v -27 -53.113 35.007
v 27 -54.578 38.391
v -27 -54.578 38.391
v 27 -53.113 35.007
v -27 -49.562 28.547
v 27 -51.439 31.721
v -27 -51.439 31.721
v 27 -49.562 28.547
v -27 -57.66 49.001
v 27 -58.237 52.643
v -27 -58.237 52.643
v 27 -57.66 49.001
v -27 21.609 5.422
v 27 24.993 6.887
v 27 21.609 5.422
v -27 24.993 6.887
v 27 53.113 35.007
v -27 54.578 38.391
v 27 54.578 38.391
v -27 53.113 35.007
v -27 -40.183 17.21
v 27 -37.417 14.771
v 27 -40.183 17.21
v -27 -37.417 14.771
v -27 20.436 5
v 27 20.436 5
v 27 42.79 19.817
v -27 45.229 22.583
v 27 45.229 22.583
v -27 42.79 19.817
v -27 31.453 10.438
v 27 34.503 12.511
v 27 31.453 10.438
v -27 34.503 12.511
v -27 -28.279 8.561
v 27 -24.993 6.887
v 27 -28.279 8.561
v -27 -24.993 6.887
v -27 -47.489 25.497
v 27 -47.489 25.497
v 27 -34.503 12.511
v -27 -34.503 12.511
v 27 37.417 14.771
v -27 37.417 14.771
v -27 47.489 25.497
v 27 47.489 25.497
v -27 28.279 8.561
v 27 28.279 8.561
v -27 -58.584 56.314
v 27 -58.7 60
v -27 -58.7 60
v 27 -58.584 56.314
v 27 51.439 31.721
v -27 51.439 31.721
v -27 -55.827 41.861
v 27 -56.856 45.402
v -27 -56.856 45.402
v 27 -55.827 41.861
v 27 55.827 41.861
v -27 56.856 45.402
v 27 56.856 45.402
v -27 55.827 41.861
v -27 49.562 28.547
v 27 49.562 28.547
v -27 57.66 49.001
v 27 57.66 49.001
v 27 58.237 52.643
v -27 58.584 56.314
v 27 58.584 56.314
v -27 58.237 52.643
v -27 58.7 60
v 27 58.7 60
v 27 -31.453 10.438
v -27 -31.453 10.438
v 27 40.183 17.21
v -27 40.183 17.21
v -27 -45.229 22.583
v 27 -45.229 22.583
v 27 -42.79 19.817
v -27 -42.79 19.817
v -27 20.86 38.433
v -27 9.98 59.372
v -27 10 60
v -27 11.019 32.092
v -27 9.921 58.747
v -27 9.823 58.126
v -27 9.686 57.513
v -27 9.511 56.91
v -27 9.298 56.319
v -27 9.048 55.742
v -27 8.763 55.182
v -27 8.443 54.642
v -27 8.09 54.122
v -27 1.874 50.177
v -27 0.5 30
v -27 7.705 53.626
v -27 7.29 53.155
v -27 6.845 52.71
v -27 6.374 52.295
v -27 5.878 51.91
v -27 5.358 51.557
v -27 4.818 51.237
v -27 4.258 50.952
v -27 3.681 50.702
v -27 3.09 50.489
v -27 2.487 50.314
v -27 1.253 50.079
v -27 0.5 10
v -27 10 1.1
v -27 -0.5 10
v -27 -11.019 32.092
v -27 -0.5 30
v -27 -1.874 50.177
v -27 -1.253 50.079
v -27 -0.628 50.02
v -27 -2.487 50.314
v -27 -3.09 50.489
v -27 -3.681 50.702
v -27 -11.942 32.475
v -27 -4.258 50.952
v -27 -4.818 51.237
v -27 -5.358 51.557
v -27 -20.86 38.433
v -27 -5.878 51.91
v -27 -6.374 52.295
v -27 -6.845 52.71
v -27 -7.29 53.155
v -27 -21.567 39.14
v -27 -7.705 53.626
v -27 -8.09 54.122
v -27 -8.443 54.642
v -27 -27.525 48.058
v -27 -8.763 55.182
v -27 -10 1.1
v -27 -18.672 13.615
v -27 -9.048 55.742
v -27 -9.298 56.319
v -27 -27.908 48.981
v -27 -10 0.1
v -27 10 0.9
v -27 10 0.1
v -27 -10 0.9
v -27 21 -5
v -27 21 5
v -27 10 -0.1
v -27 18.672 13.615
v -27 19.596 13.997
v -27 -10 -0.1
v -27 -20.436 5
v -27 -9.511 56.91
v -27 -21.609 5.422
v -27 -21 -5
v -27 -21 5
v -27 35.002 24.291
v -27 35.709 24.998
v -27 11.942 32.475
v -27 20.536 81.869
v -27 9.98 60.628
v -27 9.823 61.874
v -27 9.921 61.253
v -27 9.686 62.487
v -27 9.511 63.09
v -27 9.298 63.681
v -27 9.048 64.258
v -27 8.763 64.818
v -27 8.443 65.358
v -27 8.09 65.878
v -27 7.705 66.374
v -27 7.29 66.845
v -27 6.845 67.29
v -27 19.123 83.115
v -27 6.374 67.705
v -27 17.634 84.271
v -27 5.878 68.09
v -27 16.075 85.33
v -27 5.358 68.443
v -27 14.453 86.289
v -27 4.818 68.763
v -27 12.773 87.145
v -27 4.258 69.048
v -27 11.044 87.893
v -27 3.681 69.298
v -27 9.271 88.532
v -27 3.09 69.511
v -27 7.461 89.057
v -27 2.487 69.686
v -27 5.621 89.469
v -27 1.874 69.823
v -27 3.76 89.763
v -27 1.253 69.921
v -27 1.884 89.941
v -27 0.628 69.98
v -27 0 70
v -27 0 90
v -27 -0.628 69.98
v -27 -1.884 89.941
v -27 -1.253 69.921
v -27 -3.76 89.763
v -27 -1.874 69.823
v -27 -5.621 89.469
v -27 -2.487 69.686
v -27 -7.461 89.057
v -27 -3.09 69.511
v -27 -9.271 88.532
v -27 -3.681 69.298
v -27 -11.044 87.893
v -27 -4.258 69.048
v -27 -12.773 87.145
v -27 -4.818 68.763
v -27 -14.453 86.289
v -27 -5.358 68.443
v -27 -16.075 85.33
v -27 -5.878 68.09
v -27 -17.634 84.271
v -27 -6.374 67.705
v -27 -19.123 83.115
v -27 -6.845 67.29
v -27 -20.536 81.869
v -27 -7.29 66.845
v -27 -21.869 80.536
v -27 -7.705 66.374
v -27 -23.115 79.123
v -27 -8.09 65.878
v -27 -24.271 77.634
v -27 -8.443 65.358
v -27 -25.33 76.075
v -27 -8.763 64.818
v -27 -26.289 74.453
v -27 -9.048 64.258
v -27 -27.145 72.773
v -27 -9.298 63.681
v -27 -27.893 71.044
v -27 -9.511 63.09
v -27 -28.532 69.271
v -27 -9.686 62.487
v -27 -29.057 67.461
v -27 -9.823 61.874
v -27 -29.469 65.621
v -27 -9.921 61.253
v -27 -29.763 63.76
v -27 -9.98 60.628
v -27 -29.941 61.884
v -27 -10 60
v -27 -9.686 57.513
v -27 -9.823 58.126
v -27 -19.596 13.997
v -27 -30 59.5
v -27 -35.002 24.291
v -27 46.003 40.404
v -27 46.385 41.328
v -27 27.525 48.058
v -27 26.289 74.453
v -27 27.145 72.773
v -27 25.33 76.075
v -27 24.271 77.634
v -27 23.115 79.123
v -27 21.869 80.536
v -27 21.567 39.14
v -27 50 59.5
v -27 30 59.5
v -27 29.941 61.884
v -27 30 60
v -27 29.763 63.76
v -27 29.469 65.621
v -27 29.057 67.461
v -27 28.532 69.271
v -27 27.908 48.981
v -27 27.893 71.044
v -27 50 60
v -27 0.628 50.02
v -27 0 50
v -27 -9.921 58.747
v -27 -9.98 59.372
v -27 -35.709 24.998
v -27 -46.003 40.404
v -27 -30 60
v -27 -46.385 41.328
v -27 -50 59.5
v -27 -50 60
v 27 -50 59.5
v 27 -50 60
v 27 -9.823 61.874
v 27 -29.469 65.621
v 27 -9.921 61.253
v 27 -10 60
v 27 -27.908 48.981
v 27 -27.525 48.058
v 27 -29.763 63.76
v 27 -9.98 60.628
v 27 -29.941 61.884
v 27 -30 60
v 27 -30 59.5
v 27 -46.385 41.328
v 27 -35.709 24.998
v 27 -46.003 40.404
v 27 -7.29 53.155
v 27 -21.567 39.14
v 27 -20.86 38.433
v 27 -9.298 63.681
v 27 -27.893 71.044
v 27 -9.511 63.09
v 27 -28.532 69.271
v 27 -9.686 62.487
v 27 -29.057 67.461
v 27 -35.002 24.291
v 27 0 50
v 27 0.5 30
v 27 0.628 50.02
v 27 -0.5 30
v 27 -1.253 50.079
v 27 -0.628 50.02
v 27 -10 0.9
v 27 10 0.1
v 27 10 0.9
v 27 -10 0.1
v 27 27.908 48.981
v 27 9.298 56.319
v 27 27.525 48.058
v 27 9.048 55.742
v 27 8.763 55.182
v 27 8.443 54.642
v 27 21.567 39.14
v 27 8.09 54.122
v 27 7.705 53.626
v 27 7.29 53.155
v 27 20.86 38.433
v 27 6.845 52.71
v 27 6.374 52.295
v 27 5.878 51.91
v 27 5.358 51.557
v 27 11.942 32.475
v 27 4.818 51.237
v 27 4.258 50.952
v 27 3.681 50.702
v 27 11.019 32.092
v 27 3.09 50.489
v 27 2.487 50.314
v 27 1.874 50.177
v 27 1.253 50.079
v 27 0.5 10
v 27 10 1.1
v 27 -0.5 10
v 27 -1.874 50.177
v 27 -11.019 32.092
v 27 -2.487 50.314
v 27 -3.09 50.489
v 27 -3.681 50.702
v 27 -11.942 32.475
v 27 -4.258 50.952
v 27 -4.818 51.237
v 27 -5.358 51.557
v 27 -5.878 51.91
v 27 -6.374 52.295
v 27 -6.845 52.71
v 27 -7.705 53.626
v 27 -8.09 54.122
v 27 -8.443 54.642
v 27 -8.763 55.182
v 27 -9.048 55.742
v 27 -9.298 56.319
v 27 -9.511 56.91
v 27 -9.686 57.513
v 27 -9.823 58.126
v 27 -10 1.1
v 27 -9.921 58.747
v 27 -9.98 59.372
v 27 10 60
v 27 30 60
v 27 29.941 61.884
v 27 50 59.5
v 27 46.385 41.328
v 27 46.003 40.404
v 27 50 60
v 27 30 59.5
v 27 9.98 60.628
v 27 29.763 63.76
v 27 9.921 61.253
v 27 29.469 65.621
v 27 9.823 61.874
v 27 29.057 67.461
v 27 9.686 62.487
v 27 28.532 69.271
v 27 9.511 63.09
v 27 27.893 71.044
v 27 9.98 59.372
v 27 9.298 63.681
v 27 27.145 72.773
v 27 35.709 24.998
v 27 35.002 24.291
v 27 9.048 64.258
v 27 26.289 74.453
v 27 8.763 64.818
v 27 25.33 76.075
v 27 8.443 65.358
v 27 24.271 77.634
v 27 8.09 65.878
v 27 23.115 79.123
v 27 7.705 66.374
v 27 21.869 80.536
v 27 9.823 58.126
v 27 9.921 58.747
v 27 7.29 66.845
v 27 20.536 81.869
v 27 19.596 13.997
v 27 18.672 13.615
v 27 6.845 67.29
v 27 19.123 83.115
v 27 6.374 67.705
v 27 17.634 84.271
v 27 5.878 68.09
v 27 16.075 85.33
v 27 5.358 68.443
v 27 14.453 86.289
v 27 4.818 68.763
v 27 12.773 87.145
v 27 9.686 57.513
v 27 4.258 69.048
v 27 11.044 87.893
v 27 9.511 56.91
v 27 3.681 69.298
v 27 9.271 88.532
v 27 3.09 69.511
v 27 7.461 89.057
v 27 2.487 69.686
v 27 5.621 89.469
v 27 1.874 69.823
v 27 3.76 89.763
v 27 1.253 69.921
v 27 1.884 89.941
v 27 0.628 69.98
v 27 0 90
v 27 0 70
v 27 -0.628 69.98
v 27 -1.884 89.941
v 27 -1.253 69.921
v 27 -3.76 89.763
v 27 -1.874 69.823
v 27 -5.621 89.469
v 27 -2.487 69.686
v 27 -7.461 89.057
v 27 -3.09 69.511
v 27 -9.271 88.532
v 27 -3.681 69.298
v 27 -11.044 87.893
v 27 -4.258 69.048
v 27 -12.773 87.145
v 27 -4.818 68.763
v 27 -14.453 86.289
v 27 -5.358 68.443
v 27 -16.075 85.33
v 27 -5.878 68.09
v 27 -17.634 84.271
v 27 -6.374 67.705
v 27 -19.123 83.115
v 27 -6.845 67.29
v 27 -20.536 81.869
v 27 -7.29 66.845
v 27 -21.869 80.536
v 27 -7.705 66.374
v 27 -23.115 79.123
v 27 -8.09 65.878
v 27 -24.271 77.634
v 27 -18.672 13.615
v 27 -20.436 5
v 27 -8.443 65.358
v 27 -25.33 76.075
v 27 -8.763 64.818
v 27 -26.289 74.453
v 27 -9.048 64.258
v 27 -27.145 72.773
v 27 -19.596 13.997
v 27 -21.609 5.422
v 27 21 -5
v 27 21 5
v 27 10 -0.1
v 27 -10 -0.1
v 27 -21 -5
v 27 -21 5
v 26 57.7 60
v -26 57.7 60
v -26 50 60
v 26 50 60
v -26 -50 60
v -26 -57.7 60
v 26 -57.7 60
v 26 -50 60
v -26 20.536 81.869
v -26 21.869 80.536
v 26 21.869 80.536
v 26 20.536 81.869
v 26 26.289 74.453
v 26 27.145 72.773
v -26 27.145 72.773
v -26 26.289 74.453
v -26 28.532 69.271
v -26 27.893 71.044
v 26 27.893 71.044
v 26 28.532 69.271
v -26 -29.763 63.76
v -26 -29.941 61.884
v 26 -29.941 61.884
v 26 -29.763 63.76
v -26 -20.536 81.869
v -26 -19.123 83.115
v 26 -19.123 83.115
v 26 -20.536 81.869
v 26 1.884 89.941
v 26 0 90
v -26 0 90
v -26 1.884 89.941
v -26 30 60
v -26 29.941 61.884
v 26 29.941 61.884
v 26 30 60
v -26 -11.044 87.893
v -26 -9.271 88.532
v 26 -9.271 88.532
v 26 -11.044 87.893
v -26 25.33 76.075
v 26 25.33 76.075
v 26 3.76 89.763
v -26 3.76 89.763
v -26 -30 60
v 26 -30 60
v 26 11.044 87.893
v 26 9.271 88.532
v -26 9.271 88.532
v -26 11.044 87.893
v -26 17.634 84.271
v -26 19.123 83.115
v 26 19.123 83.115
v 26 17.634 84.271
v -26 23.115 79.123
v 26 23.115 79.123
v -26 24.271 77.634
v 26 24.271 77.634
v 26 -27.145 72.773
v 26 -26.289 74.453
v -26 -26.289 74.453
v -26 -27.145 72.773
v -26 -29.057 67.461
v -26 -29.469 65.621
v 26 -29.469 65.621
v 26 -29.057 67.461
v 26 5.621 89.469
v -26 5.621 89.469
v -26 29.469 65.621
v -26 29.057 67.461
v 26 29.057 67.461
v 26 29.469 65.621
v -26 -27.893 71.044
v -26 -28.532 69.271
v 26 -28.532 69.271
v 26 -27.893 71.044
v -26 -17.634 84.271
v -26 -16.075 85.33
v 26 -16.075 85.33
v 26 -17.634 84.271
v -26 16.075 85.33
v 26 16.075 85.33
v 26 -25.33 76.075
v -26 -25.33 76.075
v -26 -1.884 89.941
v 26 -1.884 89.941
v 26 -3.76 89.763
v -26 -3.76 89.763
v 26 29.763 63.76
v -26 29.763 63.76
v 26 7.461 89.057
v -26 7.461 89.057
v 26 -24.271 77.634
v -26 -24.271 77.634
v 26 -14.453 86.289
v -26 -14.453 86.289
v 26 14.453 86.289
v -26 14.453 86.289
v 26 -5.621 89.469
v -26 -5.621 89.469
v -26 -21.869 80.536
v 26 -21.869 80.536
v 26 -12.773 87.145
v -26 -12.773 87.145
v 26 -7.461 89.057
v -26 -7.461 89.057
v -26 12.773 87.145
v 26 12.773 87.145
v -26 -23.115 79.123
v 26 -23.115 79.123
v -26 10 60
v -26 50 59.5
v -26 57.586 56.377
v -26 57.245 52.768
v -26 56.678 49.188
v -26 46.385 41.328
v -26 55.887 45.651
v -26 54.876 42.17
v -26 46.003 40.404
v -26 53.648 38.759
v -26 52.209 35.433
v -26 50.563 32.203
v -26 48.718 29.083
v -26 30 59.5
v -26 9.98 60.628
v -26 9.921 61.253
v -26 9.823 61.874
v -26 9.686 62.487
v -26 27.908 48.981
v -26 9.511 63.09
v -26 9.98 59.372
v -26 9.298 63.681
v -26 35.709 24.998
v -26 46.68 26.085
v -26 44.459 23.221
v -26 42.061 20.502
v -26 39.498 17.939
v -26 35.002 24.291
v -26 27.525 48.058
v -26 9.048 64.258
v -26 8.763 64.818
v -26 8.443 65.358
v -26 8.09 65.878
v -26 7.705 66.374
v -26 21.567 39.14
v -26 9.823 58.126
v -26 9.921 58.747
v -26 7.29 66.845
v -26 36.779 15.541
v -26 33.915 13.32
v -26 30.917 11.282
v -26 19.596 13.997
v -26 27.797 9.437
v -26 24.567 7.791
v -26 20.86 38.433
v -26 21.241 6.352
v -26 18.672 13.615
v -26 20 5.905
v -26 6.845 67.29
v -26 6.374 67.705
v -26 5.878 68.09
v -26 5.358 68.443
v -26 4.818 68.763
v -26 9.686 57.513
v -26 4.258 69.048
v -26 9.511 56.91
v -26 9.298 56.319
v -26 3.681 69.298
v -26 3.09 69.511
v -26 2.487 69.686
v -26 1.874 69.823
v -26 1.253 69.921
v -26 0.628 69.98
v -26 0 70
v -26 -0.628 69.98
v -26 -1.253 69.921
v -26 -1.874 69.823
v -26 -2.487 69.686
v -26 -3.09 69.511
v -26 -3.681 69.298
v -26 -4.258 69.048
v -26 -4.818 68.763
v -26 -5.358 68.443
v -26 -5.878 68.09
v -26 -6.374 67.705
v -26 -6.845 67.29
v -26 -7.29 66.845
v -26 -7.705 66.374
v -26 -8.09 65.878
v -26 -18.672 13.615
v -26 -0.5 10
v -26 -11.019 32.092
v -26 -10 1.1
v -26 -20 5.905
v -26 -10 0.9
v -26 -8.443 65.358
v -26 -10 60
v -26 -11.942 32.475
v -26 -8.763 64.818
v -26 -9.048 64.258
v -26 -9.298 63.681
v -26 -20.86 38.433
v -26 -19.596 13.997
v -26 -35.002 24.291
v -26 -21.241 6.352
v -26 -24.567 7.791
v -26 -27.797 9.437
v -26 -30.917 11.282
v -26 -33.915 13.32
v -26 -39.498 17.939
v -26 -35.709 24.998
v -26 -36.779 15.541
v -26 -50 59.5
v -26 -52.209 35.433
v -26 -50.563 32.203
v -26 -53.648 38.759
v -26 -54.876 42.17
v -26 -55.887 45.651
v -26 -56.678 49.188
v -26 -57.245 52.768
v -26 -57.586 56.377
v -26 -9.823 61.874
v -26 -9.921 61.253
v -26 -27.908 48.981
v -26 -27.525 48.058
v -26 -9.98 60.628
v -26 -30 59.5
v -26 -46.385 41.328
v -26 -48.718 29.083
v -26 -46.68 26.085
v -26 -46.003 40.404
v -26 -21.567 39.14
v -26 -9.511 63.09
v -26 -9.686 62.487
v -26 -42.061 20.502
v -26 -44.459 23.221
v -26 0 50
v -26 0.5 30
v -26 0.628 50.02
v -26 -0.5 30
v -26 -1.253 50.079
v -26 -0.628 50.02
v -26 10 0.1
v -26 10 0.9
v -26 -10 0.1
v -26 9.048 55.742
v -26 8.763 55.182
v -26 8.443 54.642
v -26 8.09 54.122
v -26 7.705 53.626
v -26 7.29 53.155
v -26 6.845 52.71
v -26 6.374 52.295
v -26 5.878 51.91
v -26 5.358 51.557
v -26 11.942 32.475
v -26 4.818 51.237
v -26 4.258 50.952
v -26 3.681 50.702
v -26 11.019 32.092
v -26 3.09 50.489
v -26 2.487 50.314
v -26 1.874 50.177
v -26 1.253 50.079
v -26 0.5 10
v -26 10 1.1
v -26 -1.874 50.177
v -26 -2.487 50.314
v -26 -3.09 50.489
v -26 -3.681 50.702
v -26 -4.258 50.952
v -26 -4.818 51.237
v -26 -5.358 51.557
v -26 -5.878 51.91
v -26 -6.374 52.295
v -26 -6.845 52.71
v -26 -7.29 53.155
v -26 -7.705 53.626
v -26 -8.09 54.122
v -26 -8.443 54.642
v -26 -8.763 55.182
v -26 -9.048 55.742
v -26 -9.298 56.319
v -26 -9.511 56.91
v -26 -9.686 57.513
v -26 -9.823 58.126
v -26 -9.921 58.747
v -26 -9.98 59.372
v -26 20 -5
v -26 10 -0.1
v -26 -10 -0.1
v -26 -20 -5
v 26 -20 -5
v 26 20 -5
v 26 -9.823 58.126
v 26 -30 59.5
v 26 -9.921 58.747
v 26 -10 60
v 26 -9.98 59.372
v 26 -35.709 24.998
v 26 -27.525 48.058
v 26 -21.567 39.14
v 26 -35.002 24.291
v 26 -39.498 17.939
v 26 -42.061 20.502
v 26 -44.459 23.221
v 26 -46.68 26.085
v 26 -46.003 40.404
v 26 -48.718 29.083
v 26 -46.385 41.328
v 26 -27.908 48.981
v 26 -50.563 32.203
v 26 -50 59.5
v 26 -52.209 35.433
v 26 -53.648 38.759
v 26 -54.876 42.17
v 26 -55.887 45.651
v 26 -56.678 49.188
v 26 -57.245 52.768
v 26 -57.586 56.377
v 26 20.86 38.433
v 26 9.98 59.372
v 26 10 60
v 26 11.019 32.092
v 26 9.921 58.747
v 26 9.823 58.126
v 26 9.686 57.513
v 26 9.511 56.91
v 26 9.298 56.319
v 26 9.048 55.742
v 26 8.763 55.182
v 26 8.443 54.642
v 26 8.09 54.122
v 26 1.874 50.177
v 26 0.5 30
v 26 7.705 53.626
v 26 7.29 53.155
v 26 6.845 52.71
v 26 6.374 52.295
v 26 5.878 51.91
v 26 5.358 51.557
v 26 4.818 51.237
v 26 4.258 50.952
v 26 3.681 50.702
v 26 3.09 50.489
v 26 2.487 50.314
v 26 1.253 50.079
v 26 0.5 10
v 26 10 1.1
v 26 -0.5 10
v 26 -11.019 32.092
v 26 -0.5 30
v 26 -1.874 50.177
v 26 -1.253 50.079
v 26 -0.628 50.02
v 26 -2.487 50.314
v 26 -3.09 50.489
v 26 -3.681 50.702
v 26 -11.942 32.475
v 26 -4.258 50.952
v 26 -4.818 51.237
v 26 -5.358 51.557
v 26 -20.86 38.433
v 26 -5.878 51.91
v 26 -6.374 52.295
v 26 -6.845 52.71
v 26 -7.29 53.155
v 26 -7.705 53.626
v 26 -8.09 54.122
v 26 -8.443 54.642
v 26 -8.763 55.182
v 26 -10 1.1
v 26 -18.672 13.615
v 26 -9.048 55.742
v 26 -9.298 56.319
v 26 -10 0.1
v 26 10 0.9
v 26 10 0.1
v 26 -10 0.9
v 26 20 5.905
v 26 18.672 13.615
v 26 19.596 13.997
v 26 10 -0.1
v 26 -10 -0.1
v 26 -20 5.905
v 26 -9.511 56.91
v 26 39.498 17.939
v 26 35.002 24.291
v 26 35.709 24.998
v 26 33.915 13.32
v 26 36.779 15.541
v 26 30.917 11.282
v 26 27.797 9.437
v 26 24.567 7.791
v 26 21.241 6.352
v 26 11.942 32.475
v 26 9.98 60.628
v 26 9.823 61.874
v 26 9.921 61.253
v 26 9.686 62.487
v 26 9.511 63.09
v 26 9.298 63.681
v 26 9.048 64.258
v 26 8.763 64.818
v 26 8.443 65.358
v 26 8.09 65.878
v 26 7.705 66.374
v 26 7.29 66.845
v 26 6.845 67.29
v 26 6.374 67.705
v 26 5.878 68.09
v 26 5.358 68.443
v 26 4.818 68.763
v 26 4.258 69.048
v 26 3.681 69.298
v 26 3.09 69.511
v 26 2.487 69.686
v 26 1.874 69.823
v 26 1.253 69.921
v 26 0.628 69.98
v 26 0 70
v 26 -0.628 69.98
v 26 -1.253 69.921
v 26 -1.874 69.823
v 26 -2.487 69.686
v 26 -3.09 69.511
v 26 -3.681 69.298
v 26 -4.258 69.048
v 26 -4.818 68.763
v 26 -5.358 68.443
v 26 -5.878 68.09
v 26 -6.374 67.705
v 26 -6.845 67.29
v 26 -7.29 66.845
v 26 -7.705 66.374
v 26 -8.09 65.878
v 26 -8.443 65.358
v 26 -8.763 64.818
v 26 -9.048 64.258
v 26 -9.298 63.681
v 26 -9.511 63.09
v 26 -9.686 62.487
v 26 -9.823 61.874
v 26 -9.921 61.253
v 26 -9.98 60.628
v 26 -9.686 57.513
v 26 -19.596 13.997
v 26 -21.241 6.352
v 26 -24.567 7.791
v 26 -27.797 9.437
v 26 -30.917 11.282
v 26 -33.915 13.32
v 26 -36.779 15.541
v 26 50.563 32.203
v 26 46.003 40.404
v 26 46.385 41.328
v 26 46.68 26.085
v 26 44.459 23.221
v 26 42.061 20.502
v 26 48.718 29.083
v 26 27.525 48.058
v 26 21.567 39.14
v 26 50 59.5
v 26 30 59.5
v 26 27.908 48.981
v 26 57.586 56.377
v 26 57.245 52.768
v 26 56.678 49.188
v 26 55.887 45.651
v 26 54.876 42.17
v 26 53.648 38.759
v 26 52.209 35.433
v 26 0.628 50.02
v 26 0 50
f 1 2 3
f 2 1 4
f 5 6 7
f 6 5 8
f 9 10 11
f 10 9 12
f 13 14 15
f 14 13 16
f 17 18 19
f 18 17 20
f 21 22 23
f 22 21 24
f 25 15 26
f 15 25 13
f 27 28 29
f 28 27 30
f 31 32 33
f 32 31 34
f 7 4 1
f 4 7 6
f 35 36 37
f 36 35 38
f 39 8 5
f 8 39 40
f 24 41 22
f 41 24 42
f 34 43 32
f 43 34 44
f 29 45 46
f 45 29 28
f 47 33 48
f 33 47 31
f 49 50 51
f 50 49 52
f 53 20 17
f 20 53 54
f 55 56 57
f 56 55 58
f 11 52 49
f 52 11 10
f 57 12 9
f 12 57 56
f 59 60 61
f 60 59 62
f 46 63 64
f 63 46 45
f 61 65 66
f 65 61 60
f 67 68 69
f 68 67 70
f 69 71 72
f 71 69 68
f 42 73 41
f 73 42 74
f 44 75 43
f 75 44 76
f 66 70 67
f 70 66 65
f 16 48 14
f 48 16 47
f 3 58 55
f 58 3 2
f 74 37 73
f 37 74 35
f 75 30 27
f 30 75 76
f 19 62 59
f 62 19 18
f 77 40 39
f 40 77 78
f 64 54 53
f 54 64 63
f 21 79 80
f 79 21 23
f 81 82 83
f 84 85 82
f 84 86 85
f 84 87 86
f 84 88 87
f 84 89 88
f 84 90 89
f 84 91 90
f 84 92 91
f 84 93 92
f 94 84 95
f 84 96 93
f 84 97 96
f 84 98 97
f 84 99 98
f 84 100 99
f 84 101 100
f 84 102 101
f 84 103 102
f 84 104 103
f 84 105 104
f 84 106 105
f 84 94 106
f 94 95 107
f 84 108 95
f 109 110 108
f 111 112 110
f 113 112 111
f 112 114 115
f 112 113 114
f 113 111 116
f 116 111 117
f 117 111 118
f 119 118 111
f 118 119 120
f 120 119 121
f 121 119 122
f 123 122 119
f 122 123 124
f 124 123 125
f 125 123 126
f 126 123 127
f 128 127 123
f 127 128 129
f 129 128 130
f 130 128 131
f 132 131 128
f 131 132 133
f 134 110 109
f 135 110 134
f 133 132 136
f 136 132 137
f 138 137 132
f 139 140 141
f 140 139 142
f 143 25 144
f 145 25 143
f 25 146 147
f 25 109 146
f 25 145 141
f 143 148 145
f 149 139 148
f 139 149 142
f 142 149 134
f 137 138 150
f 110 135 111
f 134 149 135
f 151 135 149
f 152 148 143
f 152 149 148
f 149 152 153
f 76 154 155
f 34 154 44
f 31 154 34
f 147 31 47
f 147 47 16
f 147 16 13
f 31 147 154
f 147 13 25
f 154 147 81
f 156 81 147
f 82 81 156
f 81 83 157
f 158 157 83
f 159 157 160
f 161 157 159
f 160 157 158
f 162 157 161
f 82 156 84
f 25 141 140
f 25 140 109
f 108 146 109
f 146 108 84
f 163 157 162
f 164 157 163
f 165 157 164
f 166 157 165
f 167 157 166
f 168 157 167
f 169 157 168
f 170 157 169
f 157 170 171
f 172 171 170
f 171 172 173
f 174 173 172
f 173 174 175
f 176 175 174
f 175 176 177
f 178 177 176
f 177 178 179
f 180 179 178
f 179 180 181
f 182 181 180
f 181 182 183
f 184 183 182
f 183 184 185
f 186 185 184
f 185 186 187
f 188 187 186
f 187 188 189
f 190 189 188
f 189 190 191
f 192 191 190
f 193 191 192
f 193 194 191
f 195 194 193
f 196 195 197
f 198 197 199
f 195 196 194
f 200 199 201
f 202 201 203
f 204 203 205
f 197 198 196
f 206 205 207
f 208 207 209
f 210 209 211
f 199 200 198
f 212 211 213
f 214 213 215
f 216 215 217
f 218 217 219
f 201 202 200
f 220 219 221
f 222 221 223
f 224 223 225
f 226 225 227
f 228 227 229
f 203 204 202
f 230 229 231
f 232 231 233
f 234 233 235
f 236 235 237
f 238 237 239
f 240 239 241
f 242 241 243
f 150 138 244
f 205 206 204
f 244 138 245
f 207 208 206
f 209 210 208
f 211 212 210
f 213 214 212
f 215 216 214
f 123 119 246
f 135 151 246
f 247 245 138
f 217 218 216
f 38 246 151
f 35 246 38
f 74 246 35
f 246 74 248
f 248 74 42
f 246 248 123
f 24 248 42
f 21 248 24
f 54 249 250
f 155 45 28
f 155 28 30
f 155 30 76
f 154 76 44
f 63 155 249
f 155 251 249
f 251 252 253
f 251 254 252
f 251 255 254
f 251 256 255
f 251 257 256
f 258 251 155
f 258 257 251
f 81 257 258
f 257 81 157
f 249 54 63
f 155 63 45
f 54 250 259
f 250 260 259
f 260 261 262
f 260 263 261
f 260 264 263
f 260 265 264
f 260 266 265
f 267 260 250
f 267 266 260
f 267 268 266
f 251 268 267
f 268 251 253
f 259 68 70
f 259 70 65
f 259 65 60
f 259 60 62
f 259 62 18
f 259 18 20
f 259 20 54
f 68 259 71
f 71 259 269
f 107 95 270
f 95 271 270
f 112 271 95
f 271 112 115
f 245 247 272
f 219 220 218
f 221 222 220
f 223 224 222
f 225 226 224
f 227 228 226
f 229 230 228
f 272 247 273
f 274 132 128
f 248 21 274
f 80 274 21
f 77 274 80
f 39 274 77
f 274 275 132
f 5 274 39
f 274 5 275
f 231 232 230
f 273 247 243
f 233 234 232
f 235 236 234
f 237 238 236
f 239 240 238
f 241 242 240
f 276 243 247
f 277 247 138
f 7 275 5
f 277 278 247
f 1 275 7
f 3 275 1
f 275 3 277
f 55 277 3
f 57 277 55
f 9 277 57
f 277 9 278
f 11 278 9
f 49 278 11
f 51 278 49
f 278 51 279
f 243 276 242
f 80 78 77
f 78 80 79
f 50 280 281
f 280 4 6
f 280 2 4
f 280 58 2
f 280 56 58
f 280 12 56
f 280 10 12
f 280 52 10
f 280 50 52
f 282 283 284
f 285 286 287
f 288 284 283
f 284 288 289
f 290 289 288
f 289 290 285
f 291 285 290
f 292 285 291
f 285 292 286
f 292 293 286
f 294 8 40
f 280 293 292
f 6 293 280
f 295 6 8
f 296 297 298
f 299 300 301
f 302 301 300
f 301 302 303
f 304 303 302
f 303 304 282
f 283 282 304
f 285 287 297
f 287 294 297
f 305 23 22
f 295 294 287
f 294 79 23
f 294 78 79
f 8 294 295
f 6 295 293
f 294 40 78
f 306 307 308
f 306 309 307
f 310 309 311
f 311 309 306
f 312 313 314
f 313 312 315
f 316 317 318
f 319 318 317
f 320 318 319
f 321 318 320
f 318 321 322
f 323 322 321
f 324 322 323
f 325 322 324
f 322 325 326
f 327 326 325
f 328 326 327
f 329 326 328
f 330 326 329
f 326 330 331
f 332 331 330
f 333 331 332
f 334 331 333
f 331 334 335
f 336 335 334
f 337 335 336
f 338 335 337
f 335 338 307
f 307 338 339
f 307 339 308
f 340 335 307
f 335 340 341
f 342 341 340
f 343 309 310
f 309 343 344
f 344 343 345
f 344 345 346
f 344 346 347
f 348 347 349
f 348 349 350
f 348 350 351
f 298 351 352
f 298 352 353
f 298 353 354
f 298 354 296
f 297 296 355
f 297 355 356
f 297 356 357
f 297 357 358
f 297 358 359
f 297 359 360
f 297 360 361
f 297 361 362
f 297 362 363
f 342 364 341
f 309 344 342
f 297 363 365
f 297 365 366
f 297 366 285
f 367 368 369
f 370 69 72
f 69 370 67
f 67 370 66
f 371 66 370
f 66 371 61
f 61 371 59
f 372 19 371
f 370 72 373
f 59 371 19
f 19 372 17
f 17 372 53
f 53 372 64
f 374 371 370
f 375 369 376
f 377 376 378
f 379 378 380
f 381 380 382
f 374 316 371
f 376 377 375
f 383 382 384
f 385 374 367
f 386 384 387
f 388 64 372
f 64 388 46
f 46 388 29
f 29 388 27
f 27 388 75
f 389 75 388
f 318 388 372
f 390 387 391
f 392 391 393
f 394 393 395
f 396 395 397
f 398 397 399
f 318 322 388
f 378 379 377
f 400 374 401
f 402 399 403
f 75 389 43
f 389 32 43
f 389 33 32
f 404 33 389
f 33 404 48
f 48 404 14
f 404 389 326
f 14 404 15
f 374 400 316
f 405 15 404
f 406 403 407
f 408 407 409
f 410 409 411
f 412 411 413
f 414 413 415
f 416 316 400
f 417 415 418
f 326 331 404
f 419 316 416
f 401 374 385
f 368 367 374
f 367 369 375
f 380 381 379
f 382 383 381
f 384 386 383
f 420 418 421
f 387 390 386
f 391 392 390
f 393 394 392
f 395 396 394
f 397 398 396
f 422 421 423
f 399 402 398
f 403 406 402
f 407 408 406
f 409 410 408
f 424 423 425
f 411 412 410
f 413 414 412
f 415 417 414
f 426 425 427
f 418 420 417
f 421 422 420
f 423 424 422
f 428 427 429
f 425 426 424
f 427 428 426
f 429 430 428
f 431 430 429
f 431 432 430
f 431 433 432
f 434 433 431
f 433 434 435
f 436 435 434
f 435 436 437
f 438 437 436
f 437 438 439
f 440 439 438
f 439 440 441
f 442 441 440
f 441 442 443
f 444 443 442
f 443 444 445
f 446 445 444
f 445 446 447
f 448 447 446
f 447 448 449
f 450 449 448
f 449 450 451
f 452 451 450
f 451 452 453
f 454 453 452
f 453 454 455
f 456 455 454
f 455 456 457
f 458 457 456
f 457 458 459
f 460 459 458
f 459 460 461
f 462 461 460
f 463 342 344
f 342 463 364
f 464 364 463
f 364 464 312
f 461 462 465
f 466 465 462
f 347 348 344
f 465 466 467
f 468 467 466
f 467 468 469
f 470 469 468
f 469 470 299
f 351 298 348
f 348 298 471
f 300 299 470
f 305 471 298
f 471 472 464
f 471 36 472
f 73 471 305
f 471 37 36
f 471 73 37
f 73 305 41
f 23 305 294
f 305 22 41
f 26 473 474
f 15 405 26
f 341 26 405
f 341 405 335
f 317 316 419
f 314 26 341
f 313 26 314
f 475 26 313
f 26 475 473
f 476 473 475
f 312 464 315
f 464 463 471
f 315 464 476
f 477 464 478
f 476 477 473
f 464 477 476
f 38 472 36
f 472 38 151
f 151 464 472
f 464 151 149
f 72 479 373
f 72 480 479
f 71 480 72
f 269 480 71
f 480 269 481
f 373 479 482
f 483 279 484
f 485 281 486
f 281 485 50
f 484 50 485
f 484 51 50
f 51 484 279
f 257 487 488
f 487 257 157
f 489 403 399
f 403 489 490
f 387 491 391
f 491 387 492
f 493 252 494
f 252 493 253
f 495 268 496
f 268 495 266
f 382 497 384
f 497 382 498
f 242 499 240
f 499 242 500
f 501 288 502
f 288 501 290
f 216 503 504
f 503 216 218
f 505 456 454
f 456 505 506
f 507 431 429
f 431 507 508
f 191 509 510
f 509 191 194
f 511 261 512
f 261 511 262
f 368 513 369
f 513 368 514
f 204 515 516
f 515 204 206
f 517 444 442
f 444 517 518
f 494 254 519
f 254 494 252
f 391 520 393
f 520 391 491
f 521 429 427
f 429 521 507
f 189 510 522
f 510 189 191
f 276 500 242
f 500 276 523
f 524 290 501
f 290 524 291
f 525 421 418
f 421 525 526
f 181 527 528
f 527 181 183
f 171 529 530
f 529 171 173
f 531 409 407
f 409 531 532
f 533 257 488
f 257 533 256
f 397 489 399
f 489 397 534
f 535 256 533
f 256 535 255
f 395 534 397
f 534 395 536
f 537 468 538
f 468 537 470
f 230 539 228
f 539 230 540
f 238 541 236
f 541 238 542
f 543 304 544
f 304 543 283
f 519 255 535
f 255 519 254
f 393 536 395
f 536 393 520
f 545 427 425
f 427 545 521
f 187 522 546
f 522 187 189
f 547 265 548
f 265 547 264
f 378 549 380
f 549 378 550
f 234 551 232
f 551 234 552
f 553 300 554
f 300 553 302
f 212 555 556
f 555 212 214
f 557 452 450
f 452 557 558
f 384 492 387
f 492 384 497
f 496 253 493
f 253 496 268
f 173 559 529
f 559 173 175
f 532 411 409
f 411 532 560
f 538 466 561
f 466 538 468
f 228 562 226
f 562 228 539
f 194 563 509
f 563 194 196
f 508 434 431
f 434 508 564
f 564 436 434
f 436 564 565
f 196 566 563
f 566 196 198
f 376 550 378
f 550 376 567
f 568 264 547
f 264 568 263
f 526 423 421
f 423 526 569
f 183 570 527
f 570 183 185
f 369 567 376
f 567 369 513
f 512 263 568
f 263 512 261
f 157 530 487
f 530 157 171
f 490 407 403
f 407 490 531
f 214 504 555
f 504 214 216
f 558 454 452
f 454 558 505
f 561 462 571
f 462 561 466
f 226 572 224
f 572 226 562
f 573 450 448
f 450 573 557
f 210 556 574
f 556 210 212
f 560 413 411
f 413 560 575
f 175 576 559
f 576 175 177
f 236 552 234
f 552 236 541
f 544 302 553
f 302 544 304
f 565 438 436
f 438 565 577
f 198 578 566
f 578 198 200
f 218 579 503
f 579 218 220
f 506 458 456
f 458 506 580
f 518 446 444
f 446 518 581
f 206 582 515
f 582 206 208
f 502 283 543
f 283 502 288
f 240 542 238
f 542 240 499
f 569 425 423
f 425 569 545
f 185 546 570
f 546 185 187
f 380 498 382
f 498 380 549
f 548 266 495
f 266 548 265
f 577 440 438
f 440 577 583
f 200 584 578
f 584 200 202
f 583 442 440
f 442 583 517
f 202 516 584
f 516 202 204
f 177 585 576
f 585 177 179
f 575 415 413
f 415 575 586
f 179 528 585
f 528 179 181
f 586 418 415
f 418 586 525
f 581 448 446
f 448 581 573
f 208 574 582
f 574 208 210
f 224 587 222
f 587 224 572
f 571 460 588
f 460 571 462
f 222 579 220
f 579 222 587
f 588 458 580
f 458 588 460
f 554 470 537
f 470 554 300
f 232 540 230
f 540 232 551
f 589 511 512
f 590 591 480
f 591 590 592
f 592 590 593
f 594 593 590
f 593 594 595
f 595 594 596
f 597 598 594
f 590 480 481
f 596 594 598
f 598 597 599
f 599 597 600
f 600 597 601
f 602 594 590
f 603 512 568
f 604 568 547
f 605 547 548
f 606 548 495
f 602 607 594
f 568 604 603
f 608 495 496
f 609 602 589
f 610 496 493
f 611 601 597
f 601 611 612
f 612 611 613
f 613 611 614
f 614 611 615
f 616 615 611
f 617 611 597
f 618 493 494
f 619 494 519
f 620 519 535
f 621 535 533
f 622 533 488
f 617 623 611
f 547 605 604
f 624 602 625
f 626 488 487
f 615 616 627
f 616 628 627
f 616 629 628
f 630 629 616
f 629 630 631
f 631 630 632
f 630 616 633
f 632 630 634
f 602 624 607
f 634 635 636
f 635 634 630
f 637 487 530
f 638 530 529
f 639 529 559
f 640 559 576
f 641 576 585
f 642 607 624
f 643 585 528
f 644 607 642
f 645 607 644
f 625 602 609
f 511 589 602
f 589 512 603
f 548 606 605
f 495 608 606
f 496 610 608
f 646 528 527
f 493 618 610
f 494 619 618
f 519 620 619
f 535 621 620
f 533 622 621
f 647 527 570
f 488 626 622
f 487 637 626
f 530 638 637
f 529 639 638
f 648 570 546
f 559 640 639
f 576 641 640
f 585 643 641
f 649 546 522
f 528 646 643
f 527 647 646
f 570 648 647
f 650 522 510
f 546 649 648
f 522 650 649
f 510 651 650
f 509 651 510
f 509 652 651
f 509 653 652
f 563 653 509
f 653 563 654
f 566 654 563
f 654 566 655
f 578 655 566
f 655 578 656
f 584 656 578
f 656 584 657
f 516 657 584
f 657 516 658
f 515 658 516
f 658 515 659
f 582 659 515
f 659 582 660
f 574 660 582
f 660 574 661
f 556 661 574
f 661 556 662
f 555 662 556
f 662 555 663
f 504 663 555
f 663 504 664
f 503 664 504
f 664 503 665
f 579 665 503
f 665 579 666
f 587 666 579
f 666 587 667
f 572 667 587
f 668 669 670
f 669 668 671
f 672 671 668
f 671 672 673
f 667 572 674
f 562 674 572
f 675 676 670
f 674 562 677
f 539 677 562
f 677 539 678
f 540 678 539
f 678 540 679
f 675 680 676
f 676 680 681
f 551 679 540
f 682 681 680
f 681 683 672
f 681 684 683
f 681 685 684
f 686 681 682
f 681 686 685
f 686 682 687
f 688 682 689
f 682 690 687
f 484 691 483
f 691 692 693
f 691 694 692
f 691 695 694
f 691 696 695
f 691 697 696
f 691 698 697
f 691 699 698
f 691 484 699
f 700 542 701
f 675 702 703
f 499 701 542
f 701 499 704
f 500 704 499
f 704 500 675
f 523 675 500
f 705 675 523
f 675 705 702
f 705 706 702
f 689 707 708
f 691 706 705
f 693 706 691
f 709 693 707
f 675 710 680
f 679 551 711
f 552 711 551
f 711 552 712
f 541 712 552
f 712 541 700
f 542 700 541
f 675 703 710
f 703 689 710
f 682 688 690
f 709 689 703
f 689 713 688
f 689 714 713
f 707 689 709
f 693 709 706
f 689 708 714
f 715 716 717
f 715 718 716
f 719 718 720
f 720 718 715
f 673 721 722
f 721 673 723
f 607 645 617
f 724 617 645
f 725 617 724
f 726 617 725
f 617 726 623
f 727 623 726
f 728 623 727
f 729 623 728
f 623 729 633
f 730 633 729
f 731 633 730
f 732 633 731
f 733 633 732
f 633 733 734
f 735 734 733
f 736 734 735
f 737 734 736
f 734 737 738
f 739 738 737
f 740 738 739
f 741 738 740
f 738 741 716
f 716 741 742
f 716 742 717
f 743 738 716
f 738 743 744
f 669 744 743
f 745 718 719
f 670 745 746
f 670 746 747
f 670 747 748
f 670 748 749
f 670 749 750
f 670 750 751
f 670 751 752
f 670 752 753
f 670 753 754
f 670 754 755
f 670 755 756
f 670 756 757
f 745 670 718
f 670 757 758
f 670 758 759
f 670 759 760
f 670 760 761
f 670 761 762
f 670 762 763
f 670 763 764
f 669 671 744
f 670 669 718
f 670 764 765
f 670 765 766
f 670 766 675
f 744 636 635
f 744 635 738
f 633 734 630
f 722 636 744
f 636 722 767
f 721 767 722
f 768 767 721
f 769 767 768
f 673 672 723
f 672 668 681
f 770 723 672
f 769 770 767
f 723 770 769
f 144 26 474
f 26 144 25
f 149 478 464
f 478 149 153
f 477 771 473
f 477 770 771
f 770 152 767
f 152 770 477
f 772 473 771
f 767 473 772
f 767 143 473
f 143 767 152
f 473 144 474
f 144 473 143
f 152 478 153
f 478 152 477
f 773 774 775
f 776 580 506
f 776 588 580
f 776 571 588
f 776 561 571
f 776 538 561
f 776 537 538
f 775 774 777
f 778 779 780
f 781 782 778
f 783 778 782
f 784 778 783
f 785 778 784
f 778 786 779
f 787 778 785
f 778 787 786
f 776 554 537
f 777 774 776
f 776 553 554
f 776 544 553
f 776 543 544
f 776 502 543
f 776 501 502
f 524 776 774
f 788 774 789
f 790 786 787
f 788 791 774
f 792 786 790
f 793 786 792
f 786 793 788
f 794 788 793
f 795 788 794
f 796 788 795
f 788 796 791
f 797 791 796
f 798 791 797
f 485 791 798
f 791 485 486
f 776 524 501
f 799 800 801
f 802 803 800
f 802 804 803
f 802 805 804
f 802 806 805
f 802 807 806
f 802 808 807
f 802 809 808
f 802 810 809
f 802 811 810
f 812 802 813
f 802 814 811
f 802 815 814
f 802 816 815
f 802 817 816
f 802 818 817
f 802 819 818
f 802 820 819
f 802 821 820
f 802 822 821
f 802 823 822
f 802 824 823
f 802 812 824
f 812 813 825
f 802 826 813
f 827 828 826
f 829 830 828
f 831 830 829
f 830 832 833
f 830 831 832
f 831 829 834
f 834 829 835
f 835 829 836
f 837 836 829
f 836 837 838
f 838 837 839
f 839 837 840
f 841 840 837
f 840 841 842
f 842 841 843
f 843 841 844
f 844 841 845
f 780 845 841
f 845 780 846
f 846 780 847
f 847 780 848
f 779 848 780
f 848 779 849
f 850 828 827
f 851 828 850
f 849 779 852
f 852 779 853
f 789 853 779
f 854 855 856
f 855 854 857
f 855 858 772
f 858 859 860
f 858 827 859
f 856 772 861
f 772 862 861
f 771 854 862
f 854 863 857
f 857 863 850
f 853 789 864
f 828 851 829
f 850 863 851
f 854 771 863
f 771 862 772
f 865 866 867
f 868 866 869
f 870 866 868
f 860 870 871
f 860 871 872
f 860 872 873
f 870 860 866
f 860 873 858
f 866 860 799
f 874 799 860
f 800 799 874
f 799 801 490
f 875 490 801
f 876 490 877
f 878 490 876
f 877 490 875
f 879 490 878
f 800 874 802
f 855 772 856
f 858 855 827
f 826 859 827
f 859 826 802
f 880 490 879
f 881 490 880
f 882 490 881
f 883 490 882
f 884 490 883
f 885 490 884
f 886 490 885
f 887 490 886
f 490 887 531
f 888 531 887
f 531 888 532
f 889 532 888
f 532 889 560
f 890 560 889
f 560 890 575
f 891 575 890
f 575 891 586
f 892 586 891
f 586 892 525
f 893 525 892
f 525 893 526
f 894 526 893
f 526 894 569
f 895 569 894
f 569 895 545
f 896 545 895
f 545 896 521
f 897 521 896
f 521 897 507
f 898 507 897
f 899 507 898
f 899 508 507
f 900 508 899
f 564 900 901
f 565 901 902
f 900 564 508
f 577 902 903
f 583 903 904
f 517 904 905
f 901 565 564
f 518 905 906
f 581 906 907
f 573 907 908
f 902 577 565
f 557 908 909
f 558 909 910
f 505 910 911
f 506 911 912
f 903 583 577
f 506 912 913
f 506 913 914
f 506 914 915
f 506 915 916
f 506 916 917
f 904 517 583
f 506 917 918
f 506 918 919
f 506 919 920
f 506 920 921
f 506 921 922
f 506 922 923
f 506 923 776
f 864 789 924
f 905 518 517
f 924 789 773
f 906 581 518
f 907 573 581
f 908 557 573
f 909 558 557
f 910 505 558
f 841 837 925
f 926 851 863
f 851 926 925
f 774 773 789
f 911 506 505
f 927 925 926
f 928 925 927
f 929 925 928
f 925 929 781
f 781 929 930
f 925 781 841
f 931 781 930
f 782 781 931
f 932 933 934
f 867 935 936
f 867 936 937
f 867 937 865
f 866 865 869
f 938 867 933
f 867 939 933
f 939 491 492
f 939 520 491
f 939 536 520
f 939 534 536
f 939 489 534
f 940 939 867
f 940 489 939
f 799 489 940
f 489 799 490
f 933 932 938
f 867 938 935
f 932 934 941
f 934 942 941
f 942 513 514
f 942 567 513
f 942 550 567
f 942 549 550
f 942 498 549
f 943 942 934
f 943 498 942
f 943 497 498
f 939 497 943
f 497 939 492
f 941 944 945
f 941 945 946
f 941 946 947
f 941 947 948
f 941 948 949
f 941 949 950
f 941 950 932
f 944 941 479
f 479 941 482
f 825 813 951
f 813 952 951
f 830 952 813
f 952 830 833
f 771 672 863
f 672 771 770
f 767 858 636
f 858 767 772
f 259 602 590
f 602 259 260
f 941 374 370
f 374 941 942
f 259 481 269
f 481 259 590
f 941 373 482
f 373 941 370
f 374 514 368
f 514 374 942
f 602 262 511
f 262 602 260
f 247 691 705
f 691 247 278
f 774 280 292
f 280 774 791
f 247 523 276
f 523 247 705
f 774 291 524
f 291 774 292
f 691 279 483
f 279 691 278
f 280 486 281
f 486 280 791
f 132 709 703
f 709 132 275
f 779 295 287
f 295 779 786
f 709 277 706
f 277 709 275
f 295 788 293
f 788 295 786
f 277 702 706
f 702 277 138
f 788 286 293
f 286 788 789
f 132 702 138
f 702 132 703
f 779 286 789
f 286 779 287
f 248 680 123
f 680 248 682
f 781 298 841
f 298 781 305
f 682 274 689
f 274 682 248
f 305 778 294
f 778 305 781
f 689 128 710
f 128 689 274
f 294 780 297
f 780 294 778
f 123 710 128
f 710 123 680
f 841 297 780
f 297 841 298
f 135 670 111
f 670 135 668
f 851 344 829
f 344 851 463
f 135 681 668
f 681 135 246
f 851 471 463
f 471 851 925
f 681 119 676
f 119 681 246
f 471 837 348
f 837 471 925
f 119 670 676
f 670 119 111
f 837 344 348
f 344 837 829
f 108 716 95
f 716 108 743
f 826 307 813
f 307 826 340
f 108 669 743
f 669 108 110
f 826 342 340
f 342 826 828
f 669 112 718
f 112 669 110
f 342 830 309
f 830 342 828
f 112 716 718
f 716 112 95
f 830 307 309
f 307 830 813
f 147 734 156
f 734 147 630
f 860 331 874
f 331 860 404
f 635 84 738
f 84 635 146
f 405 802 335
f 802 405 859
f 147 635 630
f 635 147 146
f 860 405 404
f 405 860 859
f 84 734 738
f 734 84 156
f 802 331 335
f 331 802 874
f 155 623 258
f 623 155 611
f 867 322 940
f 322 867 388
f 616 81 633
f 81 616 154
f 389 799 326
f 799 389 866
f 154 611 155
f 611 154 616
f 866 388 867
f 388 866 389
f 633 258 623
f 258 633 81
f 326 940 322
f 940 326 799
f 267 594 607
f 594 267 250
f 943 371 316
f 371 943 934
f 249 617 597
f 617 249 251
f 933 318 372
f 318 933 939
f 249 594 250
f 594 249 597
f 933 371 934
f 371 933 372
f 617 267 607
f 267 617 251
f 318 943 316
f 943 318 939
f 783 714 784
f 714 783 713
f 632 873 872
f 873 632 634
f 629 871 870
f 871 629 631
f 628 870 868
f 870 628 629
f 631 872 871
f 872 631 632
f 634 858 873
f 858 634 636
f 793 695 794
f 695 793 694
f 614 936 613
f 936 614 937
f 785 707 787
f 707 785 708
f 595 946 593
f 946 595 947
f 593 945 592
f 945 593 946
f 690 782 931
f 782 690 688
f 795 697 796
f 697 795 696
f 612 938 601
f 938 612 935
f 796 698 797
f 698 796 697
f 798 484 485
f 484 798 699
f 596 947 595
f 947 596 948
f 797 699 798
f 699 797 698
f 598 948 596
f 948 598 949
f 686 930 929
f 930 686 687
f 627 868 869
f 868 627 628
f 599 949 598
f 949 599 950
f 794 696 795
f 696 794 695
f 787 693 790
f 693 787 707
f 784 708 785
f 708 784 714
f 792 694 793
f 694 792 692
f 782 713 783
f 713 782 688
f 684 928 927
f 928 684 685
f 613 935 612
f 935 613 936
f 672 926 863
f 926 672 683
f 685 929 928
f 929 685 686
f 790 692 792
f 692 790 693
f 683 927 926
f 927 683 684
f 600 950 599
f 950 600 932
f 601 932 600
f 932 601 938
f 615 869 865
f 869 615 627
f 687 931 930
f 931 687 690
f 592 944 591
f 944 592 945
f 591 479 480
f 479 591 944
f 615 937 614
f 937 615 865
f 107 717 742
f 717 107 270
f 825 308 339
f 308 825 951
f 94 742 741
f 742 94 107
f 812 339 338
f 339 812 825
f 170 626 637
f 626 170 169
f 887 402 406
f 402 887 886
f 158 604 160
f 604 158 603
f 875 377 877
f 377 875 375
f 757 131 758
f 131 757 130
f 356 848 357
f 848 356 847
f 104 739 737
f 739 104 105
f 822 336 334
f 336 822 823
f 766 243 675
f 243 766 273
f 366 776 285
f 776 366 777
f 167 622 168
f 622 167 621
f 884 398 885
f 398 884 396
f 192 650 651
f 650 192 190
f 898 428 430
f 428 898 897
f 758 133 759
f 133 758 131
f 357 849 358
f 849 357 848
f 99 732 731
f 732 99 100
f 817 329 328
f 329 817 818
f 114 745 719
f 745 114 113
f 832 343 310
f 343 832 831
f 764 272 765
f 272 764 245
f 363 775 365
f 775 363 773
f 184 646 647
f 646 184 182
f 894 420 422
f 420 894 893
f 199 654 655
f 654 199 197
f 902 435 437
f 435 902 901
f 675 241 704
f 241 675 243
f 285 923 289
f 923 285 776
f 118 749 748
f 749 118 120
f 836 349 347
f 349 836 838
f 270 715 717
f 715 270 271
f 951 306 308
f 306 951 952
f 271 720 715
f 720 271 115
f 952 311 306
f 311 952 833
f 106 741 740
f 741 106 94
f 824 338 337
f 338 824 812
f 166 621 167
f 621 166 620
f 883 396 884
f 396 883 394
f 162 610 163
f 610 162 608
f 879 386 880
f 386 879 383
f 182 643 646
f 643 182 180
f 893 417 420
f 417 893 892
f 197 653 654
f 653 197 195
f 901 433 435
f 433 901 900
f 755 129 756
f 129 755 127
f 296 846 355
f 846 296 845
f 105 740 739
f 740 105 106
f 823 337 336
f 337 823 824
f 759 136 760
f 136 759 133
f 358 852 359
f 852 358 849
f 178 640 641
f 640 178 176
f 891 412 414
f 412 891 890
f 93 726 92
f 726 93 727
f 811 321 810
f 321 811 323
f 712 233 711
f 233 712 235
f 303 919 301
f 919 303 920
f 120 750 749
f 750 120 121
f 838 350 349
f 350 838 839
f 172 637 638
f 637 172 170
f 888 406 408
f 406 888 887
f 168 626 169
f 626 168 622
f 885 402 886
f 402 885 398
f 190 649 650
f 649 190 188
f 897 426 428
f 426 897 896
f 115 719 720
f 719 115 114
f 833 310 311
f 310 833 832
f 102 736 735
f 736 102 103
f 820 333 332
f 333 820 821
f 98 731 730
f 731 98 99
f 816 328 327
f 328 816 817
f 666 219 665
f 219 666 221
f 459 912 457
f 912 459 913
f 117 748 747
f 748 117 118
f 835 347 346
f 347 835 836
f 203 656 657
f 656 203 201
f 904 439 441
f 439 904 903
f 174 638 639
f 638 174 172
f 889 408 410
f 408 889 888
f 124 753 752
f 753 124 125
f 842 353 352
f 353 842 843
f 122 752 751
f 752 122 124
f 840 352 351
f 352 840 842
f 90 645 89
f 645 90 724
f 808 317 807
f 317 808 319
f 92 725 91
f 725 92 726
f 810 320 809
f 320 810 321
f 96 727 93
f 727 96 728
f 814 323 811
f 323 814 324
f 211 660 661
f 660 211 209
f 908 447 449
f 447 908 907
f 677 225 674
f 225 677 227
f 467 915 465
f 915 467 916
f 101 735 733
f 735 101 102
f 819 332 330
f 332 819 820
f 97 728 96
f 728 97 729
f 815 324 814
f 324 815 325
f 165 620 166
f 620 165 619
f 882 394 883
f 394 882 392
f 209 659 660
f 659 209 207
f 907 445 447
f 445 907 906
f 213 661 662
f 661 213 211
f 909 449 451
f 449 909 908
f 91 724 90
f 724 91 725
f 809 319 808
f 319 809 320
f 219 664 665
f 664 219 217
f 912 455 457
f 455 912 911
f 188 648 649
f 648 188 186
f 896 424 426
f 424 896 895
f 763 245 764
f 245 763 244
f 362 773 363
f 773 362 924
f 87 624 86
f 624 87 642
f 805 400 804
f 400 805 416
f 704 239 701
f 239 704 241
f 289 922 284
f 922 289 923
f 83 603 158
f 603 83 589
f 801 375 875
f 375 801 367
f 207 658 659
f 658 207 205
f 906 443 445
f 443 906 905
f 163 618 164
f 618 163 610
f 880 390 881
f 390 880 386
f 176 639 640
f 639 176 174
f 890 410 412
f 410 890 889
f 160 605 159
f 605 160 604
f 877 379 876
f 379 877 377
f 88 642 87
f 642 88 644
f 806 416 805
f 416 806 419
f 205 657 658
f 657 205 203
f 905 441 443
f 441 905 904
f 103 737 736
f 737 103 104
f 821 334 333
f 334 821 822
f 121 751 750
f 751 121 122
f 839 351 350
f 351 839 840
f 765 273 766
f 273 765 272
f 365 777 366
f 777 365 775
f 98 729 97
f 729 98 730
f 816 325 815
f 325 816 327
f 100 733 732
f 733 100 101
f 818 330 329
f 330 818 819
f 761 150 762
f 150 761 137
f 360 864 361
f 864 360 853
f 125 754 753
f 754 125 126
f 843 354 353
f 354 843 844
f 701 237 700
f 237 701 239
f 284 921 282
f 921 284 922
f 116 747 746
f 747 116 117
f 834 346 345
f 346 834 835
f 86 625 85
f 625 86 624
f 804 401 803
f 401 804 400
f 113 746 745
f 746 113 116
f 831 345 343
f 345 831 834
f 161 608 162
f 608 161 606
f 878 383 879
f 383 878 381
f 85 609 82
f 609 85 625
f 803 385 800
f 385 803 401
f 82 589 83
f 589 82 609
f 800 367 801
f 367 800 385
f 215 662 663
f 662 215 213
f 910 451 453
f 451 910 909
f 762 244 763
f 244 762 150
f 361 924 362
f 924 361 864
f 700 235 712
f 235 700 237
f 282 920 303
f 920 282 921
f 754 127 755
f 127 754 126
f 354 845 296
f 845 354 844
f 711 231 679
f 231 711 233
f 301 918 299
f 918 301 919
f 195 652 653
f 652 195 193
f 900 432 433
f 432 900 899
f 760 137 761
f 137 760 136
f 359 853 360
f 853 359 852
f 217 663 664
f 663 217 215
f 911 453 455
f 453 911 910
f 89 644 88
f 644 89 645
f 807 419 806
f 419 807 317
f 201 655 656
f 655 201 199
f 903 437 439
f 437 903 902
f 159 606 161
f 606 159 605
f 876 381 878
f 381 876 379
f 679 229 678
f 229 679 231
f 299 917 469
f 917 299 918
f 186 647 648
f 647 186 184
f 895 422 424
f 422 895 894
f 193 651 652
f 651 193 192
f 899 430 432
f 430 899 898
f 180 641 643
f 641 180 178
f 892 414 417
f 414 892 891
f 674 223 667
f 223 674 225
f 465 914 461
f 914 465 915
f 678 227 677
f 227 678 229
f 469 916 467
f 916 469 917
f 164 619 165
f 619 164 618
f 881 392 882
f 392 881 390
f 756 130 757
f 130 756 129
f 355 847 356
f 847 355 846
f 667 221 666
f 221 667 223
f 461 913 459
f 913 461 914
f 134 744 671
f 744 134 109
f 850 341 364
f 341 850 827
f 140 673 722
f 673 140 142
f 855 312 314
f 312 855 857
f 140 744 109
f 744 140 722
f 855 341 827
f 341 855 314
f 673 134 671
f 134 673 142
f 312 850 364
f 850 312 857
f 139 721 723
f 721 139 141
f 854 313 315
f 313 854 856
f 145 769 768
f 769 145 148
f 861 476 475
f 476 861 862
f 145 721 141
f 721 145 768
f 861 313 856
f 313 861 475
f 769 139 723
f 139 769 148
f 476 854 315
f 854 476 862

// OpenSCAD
//property of dji flip circle
height=52;
diameter=115+0.4;
radius=diameter/2;

difference(){
    union(){
        //upper cylinder
        translate([0,0,60])rotate([0,90,0])cylinder(h=height+2,r=30,center=true,$fn=100);
        //bottom cylinder(half)
        intersection(){
        translate([0,0,60])rotate([0,90,0])cylinder(h=height+2,r=radius+1,center=true,$fn=100);
        translate([0,0,60/2])cube([99,999,60],center=true);
        }
        //stand
        translate([-height/2-1/2,0, 0])cube([1,42,10],center=true);
        translate([ height/2+1/2,0, 0])cube([1,42,10],center=true);
        translate([ 0,-40/2-1/2, 0])cube([height, 1,10],center=true);
        translate([ 0, 40/2+1/2, 0])cube([height, 1,10],center=true);
    }

    //1.dji flip it self
    translate([0,0,60])rotate([0,90,0])cylinder(h=height,r=radius,center=true,$fn=100);
    //2.upper cylinder: center
    translate([0,0,60])rotate([0,90,0])cylinder(h=999,r=10,center=true,$fn=100);
    //3.bottom cylinder: line
    for(i=[0:360/16:359]){
        translate([0,0,60])rotate([i,0,0])translate([0,40,0])cube([100,20,1],center=true);
    }
    //3.bottom cylinder: bottom
    translate([0,0,0])cube([height,40,100],center=true);
    //4.stand: marker line z=0, z=1
    translate([0,0,1])cube([100,20,0.2],center=true);
    translate([0,0,0])cube([100,20,0.2],center=true);
}
